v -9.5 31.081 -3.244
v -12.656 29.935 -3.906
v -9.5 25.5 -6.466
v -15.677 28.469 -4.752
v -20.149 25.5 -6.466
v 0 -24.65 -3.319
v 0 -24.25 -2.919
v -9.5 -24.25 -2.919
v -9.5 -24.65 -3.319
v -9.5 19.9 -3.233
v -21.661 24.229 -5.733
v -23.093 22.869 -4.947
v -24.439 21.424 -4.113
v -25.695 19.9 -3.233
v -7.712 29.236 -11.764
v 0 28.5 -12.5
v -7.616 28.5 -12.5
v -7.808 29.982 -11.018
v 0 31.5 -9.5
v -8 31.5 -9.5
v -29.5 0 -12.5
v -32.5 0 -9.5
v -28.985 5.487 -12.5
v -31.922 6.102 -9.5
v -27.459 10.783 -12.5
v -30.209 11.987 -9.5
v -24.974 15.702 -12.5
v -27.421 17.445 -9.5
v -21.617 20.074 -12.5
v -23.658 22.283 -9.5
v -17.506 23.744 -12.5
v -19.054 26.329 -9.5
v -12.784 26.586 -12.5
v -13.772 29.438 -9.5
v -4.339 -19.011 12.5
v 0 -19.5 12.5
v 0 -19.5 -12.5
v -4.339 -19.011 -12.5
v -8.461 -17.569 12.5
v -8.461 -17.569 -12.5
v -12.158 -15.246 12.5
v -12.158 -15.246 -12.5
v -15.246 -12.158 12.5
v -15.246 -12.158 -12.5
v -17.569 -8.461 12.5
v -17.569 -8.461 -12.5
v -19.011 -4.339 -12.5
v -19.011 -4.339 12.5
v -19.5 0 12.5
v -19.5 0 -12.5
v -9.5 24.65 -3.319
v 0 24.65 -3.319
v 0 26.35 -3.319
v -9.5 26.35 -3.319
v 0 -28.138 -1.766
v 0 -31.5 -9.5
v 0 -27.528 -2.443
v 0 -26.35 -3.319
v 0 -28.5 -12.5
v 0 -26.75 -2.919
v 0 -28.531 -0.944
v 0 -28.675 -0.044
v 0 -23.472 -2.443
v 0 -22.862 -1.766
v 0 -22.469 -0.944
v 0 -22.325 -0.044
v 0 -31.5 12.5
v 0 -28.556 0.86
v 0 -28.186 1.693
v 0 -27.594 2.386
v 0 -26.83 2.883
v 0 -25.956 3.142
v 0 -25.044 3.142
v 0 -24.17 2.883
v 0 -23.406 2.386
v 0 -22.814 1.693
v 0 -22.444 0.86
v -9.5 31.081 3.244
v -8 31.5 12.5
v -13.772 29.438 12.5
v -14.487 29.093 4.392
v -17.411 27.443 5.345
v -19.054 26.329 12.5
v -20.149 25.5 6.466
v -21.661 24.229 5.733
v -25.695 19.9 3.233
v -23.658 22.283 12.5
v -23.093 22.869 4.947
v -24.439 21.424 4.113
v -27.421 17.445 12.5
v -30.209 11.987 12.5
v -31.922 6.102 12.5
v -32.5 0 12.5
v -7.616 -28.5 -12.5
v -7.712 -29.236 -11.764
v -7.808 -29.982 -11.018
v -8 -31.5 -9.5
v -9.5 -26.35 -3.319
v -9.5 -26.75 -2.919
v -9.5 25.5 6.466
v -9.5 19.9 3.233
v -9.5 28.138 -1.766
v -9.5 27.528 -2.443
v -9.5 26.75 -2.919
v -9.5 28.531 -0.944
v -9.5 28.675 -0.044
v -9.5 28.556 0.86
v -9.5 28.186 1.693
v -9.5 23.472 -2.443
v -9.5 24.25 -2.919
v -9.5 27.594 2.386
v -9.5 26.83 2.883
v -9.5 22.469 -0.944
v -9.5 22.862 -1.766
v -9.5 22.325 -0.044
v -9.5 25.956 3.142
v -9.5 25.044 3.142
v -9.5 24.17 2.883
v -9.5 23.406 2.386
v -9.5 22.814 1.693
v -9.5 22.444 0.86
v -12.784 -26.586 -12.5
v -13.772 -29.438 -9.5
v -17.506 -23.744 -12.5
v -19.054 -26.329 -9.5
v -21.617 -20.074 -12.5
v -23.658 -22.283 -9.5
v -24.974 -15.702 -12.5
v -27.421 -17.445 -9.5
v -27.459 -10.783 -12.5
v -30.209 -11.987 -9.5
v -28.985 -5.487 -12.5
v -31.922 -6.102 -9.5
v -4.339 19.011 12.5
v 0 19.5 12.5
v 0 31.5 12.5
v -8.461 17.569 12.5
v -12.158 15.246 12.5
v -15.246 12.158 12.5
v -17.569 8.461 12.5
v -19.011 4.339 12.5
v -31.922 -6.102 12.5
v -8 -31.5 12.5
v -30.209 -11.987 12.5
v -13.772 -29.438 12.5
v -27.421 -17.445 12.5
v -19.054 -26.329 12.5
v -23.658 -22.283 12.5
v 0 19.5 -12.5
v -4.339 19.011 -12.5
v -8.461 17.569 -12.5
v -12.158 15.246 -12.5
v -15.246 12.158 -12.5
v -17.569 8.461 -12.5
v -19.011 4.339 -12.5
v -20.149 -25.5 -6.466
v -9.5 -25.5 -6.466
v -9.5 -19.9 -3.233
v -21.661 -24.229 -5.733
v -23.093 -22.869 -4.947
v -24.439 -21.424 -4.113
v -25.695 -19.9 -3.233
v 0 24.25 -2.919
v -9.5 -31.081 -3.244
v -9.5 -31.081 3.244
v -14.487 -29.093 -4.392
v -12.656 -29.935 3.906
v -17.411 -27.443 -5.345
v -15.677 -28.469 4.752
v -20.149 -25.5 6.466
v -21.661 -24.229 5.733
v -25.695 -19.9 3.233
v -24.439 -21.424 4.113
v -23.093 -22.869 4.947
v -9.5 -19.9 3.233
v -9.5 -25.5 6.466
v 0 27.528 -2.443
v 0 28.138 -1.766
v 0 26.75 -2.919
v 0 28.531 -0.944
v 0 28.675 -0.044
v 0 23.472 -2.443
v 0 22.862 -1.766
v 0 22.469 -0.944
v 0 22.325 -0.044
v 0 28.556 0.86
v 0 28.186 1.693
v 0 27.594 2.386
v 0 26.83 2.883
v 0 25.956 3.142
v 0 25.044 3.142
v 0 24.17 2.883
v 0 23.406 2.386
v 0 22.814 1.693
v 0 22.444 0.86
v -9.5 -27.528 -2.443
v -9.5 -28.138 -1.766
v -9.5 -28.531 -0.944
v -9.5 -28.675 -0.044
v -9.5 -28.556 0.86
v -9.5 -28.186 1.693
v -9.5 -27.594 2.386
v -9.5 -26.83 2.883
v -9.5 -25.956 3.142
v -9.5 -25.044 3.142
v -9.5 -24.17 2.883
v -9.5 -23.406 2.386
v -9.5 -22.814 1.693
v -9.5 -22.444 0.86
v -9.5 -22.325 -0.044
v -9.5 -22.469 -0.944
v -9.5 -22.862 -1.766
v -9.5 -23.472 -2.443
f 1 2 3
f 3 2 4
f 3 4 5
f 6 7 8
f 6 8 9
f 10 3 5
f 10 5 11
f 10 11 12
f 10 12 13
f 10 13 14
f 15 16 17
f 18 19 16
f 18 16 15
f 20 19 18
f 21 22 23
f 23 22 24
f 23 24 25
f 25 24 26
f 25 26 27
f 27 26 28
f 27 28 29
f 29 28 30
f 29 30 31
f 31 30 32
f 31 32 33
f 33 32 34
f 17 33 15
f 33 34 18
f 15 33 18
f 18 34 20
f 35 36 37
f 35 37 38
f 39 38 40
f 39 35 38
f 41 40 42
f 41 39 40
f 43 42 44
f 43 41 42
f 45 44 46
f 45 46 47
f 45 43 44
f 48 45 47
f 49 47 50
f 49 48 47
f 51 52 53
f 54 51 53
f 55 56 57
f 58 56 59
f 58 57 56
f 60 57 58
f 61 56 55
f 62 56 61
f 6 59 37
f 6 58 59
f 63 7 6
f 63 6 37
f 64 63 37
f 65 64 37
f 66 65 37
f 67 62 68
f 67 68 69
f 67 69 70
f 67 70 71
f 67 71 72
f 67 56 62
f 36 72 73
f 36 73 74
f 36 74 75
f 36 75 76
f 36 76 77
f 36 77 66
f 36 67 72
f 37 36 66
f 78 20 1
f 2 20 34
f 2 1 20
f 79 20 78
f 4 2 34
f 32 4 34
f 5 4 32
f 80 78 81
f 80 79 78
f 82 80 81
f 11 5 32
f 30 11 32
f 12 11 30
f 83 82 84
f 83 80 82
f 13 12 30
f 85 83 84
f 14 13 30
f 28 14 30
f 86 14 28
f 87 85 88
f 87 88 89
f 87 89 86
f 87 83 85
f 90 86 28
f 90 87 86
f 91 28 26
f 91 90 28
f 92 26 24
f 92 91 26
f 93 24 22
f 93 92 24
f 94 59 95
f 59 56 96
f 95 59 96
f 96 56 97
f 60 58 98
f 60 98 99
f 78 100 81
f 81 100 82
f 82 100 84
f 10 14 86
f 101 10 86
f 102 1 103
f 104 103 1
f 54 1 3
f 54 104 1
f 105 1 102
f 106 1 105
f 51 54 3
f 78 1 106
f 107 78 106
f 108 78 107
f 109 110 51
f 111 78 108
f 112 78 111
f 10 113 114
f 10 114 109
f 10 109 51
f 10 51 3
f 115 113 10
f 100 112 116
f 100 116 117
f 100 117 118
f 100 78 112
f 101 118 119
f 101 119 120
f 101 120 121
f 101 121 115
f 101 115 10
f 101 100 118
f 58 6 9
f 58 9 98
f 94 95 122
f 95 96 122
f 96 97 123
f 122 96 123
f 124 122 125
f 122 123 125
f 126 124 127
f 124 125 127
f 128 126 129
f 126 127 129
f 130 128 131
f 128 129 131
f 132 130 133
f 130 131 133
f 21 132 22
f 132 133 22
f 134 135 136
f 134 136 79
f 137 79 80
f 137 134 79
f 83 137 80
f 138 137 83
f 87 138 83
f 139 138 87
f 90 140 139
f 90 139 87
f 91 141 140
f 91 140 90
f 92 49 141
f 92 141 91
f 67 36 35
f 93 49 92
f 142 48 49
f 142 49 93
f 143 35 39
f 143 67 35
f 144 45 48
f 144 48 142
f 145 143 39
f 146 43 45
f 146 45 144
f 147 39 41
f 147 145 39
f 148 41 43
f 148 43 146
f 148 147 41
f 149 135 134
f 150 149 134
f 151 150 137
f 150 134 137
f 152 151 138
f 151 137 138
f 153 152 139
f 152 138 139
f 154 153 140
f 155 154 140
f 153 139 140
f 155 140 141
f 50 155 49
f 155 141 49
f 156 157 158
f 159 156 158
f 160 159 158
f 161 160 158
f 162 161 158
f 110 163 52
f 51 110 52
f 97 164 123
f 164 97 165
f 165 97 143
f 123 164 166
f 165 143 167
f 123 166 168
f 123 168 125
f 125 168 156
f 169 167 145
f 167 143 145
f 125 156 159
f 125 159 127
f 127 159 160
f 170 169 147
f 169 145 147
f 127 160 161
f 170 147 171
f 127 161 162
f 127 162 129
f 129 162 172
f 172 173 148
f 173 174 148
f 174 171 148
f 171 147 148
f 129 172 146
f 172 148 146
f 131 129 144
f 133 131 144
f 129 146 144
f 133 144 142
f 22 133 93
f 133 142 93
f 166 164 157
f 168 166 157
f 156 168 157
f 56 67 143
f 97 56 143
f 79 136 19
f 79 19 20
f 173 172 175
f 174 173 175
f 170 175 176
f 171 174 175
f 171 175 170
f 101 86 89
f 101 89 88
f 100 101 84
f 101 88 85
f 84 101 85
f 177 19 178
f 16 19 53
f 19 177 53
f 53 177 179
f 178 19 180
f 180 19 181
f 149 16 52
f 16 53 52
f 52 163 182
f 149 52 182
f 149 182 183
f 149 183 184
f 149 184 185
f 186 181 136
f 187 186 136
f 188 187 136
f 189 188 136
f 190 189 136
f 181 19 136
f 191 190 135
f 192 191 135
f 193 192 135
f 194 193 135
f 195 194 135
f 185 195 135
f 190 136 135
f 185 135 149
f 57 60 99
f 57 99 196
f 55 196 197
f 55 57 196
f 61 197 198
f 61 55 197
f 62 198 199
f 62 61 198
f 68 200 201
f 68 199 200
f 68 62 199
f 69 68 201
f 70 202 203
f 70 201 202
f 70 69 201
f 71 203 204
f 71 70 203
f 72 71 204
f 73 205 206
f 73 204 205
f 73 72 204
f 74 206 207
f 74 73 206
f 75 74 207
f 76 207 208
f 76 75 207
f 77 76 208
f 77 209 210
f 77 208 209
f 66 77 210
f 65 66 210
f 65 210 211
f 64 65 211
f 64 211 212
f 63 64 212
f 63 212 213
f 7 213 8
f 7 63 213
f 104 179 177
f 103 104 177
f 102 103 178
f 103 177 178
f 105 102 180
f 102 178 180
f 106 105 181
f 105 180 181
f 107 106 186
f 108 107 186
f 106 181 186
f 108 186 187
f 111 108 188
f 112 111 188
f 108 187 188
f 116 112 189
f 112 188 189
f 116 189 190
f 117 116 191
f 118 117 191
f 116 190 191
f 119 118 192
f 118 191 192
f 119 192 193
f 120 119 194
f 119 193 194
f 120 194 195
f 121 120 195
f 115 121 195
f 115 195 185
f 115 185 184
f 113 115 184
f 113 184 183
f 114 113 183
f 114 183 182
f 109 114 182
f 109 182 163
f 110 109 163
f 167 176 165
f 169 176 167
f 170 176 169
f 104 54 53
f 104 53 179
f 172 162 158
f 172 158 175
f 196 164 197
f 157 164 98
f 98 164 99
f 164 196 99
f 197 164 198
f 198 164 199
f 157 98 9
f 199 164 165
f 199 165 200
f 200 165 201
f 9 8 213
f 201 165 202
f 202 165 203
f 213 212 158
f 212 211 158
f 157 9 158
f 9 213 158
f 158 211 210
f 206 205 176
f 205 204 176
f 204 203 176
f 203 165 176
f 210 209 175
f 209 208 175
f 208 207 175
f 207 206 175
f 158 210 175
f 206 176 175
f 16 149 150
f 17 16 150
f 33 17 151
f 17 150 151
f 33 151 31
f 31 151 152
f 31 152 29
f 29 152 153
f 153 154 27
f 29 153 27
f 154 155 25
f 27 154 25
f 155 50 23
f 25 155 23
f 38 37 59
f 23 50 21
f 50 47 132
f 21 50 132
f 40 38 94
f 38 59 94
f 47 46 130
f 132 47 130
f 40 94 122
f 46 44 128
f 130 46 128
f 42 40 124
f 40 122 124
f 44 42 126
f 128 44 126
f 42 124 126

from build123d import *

# Parameters (mm, degrees)
PAD003_DEPTH    = 12.5
POCKET006_DEPTH = 182.8372896975
POCKET007_DEPTH = 24.5
CHAMFER002_SIZE = 3


with BuildPart() as part:
    # Sketch011 → Pad003 (new body, symmetric)
    with BuildSketch(Plane.XY):
        with BuildLine():
            ThreePointArc((0, 19.5), (-13.7885822331, 13.7885822331), (-19.5, 0))
            Line((-32.5, 0), (-19.5, 0))
            ThreePointArc((-8, 31.5), (-25.6539470647, 19.9530699392), (-32.5, 0))
            Line((0, 31.5), (-8, 31.5))
            Line((0, 31.5), (0, 19.5))
        make_face()
    pad003 = extrude(amount=PAD003_DEPTH, both=True)

    # Mirrored004: Pad003 across Sketch011 H_Axis
    add(pad003.mirror(Plane.ZX))

    # Sketch012 (on Face1 of Mirrored004) → Pocket006 (cut, through all)
    with BuildSketch(Plane.YZ):
        with BuildLine():
            ThreePointArc((26.75, -2.918582704), (25.5, 3.175), (24.25, -2.918582704))
            Line((24.25, -2.918582704), (24.65, -3.318582704))
            Line((24.65, -3.318582704), (26.35, -3.318582704))
            Line((26.35, -3.318582704), (26.75, -2.918582704))
        make_face()
    pocket006 = extrude(amount=-POCKET006_DEPTH, mode=Mode.SUBTRACT)

    # Mirrored005: Pocket006 across Sketch012 V_Axis
    add(pocket006.mirror(Plane(origin=(0, 0, 0), x_dir=(1, 0, 0), z_dir=(0, 1, 0))), mode=Mode.SUBTRACT)

    # Sketch013 (on DatumPlane) → Pocket007 (cut)
    with BuildSketch(Plane(origin=(-34, 0, 0), x_dir=(0, -1, 0), z_dir=(-1, 0, 0))):
        Polygon((-19.9, 3.2331615075), (-25.5, 6.4663230149), (-31.1, 3.2331615075), (-31.1, -3.2331615075), (-25.5, -6.4663230149), (-19.9, -3.2331615075), align=None)
    pocket007 = extrude(amount=-POCKET007_DEPTH, mode=Mode.SUBTRACT)

    # Mirrored006: Pocket007 across Sketch013 V_Axis
    add(pocket007.mirror(Plane(origin=(-34, 0, 0), x_dir=(-1, 0, 0), z_dir=(0, -1, 0))), mode=Mode.SUBTRACT)

    # Chamfer002
    chamfer002_edges = [part.edges().sort_by_distance(p)[0] for p in [
        (-4, -31.5, -12.5),
        (-25.653947, -19.95307, -12.5),
        (-25.653947, 19.95307, -12.5),
        (-4, 31.5, -12.5),
    ]]
    chamfer(chamfer002_edges, length=CHAMFER002_SIZE)


solid = part.part
